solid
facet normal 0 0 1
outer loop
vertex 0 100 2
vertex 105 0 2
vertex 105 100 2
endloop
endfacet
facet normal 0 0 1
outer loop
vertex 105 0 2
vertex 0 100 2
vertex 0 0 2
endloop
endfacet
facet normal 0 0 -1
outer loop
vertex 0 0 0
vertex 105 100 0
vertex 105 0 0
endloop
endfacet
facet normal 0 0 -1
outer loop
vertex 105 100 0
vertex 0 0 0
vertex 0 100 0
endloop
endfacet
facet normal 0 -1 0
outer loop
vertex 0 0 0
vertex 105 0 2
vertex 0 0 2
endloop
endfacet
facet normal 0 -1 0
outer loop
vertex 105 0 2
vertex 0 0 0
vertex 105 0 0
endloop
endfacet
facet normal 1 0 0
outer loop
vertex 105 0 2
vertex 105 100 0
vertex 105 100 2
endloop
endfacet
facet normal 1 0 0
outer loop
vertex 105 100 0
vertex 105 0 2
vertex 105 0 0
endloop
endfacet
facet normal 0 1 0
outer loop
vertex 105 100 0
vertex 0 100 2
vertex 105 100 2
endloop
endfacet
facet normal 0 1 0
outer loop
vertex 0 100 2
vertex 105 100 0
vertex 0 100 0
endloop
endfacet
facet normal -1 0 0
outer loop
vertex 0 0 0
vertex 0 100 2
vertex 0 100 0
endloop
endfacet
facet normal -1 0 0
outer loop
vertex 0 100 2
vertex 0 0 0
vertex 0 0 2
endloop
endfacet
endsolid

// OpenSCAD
union(){
    linear_extrude(height = 3)
    translate( [2.5,0,0] )
    import(file = "TheExtruder_3d_model_base.dxf", layer="Main");
    
    cube( size = [105,100,2]);
}
